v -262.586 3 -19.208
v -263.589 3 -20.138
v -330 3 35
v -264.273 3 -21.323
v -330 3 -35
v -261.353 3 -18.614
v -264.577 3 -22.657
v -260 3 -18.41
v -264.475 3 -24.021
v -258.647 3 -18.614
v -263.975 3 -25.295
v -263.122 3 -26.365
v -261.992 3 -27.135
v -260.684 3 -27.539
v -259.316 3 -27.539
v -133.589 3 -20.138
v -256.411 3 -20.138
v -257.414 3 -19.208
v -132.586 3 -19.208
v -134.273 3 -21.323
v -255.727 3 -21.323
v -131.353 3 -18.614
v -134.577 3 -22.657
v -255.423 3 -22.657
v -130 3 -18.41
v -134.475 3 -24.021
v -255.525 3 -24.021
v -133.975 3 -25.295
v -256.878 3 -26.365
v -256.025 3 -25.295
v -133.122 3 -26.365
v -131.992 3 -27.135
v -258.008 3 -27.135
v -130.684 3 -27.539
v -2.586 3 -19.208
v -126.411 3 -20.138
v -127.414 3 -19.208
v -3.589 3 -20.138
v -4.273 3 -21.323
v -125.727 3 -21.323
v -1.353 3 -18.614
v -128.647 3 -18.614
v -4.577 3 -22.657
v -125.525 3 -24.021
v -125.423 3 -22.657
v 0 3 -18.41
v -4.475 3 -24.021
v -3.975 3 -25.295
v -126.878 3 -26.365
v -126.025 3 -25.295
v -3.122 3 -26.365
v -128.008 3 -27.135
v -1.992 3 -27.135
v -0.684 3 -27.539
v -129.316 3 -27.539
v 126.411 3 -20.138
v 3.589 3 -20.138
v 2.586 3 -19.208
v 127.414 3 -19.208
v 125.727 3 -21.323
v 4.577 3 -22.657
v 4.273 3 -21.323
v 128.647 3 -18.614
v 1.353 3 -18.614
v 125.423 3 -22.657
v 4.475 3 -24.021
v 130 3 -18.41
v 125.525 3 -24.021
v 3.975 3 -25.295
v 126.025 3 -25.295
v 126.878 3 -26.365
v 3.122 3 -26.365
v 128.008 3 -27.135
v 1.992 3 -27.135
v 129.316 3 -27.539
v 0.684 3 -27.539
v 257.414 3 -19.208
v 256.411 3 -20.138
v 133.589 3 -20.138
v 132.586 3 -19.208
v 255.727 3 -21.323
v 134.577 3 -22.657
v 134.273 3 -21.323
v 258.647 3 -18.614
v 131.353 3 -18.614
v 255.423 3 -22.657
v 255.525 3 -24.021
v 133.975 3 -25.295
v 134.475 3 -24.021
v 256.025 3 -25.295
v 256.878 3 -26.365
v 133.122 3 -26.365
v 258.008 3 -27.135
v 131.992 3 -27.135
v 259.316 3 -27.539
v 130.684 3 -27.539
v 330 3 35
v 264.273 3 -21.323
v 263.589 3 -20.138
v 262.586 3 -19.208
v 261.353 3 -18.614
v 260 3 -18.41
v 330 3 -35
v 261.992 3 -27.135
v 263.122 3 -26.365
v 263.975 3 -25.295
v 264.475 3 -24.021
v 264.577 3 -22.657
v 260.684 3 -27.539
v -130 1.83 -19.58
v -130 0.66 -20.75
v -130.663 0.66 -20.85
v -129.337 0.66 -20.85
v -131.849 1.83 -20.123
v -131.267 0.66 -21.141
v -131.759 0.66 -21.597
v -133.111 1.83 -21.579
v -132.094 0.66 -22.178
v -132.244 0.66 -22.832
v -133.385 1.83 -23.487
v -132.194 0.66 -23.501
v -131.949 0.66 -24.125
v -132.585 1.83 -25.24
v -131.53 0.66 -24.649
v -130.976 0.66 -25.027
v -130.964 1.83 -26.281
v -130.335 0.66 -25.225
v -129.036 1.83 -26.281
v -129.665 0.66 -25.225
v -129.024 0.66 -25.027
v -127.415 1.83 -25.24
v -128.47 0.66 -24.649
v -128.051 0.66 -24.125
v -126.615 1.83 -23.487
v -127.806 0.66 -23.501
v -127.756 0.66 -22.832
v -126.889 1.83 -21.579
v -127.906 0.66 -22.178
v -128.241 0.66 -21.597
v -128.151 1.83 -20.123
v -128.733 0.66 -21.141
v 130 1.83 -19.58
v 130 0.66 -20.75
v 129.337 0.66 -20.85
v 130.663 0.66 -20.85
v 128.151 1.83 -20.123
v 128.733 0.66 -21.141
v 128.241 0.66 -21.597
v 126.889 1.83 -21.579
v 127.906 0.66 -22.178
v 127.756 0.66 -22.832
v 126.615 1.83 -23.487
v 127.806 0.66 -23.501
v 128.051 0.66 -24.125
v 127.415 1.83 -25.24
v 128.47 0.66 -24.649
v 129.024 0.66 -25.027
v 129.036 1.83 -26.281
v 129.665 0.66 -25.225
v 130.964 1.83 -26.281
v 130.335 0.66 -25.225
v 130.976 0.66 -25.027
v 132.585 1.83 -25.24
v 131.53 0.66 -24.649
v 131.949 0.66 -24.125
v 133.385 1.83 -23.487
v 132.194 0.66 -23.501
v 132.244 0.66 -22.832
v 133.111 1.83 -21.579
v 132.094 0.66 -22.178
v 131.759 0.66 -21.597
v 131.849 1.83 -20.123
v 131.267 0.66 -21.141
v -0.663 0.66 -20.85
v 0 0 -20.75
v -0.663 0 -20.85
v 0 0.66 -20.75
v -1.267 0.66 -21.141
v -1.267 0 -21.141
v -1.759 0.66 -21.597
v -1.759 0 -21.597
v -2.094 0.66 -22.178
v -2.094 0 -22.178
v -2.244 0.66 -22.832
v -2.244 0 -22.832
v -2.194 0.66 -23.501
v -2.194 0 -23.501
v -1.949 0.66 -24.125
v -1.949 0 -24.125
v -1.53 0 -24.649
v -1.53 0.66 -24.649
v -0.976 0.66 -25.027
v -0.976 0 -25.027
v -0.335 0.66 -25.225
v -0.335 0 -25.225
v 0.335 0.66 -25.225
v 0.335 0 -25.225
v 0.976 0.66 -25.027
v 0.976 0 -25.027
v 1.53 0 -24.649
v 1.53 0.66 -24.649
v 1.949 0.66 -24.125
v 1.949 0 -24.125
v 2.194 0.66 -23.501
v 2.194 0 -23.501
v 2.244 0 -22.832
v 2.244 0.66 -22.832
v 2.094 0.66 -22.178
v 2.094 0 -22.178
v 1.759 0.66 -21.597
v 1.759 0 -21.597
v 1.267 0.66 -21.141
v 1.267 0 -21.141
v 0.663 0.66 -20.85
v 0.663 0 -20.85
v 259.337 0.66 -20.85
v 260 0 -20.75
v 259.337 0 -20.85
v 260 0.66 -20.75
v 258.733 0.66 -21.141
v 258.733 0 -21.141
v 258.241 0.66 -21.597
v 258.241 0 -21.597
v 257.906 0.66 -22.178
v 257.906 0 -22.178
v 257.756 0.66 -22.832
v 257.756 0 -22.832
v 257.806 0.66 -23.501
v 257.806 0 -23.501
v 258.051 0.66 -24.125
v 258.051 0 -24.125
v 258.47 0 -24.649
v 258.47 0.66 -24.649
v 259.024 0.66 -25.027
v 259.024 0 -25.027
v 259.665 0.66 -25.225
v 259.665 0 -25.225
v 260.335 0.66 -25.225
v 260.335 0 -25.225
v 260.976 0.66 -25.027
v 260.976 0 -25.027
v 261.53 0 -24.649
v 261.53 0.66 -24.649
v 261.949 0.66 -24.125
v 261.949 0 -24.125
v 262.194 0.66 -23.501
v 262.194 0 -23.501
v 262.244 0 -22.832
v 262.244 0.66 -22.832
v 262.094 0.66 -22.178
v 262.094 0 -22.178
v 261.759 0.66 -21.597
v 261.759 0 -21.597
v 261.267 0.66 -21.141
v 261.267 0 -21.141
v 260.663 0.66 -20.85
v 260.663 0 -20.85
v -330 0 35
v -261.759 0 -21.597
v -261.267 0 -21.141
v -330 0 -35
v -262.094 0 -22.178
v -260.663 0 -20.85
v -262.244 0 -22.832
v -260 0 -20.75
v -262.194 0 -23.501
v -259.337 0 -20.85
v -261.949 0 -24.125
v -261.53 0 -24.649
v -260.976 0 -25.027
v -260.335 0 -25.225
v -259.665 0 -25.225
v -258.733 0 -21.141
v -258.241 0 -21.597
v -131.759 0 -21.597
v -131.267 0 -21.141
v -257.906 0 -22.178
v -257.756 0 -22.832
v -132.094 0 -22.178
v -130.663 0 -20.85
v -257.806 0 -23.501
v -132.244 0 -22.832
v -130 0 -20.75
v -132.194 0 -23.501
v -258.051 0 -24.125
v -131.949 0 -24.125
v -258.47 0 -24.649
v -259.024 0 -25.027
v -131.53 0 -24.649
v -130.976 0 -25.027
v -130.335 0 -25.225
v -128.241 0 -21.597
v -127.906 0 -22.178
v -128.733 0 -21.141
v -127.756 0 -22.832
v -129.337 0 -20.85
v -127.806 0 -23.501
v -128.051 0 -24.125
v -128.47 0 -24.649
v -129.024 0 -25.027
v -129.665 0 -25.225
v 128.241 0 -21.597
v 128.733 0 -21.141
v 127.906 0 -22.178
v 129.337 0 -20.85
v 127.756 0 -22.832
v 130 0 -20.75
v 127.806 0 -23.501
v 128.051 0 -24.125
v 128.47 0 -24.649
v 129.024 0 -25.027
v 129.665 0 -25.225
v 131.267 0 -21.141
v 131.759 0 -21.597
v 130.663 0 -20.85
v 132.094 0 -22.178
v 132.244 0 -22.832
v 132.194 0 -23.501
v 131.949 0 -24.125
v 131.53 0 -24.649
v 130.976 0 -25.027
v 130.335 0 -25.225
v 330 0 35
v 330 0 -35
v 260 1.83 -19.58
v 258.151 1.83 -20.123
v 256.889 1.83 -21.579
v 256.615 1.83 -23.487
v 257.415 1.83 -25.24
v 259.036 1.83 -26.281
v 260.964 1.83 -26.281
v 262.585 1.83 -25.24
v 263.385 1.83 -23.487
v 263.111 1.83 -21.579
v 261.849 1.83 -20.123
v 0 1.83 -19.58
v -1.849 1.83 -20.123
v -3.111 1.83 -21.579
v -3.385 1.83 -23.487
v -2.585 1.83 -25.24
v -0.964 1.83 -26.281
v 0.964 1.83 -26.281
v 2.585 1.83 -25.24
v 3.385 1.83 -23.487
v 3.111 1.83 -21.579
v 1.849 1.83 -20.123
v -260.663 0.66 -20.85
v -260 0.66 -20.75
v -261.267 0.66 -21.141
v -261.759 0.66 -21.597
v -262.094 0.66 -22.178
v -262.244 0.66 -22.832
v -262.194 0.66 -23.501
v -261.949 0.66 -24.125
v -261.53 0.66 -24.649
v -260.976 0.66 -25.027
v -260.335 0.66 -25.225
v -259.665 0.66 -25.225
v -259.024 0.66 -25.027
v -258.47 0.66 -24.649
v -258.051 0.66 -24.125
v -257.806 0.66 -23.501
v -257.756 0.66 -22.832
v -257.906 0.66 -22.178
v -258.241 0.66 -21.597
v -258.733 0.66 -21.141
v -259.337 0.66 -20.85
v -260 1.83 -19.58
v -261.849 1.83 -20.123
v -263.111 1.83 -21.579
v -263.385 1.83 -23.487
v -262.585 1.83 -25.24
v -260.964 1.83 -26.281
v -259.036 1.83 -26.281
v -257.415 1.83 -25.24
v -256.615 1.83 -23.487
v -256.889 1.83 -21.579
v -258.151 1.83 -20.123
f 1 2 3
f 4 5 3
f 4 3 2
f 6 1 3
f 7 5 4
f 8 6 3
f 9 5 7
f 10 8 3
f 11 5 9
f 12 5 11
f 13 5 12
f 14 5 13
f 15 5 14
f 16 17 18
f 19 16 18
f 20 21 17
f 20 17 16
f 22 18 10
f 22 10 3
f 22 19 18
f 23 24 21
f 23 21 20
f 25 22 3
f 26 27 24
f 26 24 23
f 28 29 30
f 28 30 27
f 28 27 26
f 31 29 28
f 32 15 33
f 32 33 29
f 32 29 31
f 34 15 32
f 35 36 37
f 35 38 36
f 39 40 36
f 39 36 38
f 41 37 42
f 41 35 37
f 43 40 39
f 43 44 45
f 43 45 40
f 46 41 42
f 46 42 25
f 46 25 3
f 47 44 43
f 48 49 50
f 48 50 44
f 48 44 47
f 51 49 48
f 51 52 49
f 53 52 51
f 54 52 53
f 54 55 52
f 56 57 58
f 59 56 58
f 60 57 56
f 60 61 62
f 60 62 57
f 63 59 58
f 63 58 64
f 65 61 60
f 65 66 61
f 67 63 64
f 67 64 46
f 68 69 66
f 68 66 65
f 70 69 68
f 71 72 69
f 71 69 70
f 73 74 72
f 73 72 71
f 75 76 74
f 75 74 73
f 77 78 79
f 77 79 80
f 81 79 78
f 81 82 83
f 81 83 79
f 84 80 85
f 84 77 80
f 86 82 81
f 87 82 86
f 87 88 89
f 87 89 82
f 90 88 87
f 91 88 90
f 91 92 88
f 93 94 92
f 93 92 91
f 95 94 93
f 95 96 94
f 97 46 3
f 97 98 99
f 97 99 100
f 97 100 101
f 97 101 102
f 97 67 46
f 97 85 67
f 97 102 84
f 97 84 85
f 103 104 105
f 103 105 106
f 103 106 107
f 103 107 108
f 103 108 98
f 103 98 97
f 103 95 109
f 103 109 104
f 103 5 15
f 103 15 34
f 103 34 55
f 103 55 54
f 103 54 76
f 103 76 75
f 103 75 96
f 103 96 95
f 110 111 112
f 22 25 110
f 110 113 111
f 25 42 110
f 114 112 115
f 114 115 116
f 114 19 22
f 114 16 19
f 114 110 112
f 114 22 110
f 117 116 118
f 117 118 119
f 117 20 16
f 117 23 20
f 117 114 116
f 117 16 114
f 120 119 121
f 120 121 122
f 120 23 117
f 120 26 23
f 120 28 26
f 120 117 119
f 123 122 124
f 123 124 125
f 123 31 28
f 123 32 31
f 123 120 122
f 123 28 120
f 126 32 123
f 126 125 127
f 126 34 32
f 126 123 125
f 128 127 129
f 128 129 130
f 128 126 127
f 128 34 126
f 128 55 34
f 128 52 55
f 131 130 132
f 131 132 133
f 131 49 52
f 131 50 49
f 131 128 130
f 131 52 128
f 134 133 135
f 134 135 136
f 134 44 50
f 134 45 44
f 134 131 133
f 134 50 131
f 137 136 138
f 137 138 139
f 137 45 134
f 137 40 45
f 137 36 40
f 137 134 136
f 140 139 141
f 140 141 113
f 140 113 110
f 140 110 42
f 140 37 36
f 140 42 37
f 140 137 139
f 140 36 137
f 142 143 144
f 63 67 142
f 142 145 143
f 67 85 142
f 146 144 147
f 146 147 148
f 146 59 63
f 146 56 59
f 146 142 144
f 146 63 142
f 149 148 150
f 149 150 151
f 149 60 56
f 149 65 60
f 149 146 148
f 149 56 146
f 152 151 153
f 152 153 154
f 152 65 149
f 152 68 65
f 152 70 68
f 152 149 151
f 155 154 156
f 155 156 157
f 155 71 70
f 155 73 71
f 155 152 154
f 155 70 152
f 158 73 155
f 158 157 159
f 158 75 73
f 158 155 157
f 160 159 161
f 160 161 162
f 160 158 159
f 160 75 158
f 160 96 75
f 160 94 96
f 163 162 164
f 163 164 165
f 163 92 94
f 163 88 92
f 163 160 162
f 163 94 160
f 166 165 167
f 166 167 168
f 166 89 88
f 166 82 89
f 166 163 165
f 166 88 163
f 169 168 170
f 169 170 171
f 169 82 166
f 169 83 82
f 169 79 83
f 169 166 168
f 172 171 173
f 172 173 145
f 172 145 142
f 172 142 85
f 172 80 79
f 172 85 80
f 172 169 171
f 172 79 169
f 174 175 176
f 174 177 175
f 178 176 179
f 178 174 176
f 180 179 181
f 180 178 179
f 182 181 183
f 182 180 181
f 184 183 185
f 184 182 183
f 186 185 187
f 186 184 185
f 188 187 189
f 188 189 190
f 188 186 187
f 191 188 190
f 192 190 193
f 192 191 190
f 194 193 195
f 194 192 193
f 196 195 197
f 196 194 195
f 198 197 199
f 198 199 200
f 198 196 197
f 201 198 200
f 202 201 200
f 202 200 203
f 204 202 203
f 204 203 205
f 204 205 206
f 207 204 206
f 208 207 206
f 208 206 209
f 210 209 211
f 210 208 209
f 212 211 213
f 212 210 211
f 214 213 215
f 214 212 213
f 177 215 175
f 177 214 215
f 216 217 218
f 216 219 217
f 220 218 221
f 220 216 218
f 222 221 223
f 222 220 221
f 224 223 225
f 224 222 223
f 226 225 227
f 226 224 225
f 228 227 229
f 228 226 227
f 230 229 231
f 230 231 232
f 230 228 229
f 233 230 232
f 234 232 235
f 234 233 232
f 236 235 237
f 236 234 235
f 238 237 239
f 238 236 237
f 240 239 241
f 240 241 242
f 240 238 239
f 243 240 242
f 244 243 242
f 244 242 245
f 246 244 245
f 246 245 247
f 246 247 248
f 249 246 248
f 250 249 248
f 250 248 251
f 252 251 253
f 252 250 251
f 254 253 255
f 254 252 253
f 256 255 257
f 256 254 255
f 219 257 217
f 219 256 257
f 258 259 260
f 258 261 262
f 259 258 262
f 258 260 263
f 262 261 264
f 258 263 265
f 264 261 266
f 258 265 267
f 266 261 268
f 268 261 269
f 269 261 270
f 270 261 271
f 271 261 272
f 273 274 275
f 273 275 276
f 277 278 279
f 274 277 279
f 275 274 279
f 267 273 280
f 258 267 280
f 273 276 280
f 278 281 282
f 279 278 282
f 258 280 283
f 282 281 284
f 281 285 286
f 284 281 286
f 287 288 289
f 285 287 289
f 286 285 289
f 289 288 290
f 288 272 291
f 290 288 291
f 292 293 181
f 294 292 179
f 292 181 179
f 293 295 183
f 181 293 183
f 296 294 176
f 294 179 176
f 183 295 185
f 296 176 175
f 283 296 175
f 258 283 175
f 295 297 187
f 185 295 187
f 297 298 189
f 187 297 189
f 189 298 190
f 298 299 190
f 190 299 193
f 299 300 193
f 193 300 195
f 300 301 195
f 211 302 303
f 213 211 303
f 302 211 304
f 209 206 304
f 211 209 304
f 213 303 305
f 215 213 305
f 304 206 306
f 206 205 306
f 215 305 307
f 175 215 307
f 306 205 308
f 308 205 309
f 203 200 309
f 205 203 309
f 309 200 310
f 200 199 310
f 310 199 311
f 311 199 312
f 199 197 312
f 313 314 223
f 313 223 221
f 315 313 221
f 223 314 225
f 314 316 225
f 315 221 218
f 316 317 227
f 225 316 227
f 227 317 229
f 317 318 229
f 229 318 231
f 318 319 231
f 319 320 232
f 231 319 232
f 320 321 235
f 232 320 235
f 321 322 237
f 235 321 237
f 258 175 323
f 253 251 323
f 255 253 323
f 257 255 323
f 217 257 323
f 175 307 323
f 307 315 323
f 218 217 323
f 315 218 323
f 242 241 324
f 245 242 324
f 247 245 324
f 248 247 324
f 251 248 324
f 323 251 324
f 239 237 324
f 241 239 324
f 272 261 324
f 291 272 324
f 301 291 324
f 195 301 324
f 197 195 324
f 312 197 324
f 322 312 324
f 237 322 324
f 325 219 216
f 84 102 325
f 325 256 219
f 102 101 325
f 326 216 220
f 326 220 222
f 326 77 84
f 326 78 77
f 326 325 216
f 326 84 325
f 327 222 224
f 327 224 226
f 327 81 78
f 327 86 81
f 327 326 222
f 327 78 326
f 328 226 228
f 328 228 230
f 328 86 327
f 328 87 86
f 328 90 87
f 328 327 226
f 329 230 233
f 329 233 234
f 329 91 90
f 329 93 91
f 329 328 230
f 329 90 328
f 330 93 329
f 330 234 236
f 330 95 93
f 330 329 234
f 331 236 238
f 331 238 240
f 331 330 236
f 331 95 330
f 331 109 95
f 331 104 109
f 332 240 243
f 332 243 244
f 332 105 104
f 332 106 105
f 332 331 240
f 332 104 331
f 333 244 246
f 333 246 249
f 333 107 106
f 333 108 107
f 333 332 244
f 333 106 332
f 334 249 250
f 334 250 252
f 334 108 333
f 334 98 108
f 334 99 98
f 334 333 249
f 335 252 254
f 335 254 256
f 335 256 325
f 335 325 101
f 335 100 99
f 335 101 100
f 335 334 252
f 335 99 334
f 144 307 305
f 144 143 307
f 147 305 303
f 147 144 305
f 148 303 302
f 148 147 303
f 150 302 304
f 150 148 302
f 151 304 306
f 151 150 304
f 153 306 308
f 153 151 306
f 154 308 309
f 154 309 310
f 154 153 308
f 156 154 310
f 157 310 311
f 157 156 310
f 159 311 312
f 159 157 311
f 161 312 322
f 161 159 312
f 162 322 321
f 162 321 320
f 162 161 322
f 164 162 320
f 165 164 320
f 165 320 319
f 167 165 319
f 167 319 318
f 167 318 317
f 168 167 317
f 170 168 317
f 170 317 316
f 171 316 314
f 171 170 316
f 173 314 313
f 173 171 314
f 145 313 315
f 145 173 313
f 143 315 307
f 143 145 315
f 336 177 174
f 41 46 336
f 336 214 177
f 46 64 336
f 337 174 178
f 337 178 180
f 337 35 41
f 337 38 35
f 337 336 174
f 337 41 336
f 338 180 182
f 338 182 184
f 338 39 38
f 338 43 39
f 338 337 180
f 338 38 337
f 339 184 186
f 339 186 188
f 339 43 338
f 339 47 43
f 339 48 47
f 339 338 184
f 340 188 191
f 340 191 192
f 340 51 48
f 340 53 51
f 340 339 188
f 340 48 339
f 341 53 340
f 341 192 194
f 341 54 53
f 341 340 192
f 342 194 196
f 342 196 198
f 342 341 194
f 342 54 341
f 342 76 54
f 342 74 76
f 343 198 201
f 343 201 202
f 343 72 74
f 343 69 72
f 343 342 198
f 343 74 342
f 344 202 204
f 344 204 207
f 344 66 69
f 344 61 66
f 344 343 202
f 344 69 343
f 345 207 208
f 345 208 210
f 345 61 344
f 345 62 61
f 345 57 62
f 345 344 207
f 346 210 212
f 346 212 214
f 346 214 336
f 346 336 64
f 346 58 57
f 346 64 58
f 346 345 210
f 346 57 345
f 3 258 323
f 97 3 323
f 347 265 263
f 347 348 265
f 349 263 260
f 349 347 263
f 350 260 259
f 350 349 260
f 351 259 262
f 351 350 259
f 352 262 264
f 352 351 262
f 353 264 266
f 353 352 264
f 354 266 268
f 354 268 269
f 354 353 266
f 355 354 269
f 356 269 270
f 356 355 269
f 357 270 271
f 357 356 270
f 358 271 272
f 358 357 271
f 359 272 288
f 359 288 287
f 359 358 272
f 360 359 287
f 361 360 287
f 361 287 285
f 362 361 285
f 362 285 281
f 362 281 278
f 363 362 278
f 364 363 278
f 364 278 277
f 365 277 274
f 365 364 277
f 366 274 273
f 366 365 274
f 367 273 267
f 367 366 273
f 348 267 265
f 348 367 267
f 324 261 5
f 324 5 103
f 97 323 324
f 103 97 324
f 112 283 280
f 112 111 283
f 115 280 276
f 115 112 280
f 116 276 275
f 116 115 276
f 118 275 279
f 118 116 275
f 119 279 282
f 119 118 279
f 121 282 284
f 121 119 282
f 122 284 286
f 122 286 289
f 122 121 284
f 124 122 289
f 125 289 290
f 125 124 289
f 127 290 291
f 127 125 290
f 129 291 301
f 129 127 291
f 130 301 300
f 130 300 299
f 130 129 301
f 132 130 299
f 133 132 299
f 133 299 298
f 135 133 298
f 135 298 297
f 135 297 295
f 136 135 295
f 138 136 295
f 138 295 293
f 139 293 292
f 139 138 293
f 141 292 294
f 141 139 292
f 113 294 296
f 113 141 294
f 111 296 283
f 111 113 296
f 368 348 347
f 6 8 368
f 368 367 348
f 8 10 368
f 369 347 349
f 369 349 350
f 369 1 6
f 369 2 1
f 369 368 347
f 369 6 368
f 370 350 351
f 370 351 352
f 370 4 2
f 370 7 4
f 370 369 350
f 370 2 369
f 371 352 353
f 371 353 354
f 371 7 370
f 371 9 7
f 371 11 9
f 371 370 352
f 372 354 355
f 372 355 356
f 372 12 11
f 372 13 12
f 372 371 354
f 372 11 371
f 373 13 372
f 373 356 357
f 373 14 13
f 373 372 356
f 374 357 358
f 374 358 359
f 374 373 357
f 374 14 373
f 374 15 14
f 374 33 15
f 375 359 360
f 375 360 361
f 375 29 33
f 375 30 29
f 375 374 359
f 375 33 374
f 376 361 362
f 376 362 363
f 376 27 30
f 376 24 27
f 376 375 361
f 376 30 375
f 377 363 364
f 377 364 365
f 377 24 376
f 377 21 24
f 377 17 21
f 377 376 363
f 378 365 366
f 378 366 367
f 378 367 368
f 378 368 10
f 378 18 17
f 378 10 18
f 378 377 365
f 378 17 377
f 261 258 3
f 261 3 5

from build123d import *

# Parameters (mm, degrees)
SKETCH1_W           = 660
SKETCH1_H           = 70
BOSS_EXTRUDE1_DEPTH = 3
LPATTERN1_COUNT     = 5
LPATTERN1_PITCH     = 130


with BuildPart() as part:
    # Sketch1 → Boss-Extrude1 (new body)
    with BuildSketch(Plane(origin=(0, 0, 0), x_dir=(1, 0, 0), z_dir=(0, 1, 0))):
        Rectangle(SKETCH1_W, SKETCH1_H)
    extrude(amount=BOSS_EXTRUDE1_DEPTH)

    # Sketch2 → CSK for M4 Hex Socket Countersunk Head Screw1 (revolve, cut)
    with BuildSketch(Plane(origin=(-260, 3, -23), x_dir=(0, 0, 1), z_dir=(1, 0, 0))):
        Polygon((0, 0), (0, 3), (2.25, 3), (2.25, 2.34), (4.59, 0), align=None)
    csk_for_m4_hex_socket_countersunk_head_s = revolve(axis=Axis((-260, 9.35, -23), (0, -1, 0)), mode=Mode.SUBTRACT)

    # LPattern1: CSK for M4 Hex Socket Countersunk Head Screw1 ×5
    with Locations(*[(i * LPATTERN1_PITCH, 0, 0) for i in range(1, LPATTERN1_COUNT)]):
        add(csk_for_m4_hex_socket_countersunk_head_s, mode=Mode.SUBTRACT)


solid = part.part
